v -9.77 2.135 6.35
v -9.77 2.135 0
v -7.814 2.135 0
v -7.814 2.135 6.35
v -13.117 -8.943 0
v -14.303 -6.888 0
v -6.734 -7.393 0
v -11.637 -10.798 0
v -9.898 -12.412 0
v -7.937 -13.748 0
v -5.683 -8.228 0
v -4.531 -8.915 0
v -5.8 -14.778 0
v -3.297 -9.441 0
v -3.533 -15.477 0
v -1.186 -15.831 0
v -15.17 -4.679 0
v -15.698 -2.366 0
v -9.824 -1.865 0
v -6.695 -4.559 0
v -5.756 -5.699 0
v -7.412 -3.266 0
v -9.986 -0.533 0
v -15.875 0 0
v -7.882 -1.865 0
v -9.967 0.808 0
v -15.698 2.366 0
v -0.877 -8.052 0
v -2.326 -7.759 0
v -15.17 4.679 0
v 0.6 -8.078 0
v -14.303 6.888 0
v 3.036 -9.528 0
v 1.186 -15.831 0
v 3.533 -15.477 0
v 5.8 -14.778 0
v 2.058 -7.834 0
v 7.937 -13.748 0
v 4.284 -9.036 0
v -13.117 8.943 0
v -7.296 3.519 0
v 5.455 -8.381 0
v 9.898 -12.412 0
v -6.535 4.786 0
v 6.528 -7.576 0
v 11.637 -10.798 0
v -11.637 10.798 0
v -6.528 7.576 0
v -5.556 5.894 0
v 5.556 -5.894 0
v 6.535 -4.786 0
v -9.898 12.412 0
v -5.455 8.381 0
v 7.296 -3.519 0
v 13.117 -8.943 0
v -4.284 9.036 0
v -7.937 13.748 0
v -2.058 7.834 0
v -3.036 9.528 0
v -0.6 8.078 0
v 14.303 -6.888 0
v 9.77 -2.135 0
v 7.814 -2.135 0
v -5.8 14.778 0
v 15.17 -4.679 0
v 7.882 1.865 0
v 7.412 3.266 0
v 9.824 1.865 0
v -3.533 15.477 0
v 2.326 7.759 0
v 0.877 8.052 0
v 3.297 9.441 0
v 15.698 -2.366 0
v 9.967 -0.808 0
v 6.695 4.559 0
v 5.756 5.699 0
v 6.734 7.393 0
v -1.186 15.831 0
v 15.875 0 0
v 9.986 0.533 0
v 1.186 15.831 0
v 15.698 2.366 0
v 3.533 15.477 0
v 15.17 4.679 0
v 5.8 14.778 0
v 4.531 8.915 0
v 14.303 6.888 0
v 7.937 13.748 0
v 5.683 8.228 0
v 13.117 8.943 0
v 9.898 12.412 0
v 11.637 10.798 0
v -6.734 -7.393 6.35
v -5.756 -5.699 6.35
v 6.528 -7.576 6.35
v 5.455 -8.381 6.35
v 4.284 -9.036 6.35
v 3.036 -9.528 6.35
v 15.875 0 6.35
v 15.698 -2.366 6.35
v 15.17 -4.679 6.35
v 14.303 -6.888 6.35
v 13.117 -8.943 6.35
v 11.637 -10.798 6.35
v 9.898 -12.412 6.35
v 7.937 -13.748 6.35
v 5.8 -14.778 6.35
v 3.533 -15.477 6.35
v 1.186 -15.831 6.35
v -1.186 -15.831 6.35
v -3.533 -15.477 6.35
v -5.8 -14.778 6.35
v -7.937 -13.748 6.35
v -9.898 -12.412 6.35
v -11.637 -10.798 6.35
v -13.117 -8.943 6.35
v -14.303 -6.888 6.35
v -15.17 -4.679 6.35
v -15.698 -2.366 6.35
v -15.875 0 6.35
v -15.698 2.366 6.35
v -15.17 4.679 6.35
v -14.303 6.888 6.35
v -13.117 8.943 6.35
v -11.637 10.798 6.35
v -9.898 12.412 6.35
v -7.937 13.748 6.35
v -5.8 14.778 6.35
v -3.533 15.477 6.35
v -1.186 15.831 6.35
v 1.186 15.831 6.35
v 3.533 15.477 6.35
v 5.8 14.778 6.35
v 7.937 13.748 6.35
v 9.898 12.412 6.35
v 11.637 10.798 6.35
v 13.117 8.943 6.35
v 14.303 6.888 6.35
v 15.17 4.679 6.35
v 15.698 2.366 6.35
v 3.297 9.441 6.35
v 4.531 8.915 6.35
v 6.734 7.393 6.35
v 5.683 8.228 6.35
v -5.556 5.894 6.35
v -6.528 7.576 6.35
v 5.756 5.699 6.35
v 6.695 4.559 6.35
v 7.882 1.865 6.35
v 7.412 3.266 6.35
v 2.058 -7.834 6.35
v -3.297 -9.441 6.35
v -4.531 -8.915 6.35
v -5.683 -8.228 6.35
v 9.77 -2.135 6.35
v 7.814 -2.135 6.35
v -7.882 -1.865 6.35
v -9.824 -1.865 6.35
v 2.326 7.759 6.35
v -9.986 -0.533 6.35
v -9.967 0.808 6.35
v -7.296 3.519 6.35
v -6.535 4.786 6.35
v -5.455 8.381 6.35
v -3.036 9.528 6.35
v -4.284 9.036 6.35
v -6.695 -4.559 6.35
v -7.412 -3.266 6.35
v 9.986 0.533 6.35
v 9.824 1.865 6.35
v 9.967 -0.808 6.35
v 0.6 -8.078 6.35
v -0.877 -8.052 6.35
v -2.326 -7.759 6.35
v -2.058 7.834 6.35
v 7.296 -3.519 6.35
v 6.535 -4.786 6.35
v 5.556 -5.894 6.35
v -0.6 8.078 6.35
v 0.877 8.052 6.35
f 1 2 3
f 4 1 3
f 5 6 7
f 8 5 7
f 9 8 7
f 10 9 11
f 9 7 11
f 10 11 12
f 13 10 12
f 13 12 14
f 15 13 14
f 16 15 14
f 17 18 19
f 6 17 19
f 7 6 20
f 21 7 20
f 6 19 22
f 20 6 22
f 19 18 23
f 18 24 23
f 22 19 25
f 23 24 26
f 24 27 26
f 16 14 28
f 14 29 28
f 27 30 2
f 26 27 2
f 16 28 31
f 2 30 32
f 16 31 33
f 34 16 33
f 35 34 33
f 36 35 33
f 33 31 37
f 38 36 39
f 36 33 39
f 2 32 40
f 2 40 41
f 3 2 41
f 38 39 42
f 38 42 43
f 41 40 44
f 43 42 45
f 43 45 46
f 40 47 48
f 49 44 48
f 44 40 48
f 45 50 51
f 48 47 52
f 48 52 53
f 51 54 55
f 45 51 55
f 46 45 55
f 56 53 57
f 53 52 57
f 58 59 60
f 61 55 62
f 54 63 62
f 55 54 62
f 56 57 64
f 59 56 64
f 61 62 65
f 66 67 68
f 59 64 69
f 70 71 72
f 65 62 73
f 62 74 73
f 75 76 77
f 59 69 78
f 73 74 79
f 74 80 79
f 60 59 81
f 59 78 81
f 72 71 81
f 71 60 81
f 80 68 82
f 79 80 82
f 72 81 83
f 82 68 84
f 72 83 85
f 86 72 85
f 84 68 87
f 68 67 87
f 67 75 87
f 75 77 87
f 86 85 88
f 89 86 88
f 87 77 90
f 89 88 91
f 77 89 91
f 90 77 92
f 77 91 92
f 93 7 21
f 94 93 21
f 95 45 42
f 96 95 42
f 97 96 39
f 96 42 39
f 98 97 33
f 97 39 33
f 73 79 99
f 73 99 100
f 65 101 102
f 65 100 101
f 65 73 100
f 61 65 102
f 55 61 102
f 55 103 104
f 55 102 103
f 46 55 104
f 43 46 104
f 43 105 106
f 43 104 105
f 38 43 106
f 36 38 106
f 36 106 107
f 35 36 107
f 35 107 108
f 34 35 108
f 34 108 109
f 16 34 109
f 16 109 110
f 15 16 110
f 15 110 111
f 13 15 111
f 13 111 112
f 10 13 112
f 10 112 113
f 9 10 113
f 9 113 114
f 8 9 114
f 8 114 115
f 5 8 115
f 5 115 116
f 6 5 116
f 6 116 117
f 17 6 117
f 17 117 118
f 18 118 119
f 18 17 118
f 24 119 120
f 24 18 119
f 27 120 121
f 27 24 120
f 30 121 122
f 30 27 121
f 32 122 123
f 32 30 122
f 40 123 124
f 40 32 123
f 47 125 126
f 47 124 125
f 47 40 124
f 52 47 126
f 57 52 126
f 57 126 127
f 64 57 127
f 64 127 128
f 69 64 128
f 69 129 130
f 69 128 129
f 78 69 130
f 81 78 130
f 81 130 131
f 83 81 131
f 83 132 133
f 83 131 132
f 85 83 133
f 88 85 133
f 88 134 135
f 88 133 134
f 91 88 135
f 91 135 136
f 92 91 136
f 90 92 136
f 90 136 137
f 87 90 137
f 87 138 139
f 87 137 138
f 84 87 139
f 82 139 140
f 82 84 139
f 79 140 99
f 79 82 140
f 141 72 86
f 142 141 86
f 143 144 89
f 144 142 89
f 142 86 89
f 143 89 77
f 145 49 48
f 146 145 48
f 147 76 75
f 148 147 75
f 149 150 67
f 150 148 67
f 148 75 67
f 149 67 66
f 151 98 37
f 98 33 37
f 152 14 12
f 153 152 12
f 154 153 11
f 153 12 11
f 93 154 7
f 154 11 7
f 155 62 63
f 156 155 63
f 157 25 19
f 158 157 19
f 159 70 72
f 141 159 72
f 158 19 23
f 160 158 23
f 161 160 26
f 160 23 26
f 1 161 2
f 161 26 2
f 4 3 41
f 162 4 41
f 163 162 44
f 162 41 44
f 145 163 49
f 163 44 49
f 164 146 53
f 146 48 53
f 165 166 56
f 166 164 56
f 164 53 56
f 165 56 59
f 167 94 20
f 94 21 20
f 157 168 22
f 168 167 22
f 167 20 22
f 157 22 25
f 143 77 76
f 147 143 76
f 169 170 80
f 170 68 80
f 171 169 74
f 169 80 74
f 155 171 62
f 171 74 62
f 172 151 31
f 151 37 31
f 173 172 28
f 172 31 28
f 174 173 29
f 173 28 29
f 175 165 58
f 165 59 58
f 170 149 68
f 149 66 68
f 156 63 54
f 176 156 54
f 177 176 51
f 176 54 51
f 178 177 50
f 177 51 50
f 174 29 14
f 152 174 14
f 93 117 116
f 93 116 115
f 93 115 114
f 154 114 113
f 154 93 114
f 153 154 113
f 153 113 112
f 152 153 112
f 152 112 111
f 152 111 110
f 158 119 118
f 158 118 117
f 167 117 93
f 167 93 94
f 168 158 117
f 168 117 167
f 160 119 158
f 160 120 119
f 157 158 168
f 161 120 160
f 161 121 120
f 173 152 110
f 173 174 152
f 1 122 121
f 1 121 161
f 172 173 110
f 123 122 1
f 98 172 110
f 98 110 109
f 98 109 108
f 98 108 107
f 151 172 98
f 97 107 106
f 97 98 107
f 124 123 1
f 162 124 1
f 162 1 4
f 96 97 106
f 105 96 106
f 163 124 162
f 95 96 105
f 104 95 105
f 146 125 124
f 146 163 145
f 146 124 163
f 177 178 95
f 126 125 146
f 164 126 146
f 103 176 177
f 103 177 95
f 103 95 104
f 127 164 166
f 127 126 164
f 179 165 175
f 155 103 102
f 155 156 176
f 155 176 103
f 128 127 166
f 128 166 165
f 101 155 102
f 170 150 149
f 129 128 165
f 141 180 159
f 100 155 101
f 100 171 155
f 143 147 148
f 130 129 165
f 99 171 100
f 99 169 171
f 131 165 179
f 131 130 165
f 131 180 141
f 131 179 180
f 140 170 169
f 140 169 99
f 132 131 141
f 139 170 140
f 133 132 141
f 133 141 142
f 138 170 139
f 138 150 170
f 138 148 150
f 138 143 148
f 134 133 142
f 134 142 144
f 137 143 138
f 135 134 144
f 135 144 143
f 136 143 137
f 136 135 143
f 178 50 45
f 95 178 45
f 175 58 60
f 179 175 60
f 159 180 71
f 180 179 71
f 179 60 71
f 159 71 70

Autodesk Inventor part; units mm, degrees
ref_plane "YZ Plane" through (0, 0, 0) normal (1, 0, 0) x (0, 1, 0)
ref_plane "XZ Plane" through (0, 0, 0) normal (0, 1, 0) x (-1, 0, 0)
ref_plane "XY Plane" through (0, 0, 0) normal (0, 0, 1) x (1, 0, 0)
sketch "Sketch1" plane through (0, 0, 0) normal (0, 0, 1) x (1, 0, 0)
  circle A0 centre (0, 0) radius 15.875
  line L0 (7.8823, 1.8652) -> (9.8245, 1.8652)
  arc A1 (9.7695, -2.1348) -> (9.8245, 1.8652) centre (0, 0) ccw
  line L1 (9.7695, -2.1348) -> (7.8136, -2.1348)
  arc A2 (5.5564, -5.8937) -> (7.8136, -2.1348) centre (0, 0) ccw
  line L2 (5.5564, -5.8937) -> (6.5275, -7.5757)
  arc A3 (3.0359, -9.528) -> (6.5275, -7.5757) centre (0, 0) ccw
  line L3 (3.0359, -9.528) -> (2.058, -7.8342)
  arc A4 (-2.3259, -7.7589) -> (2.058, -7.8342) centre (0, 0) ccw
  line L4 (-2.3259, -7.7589) -> (-3.297, -9.4409)
  arc A5 (-6.7336, -7.3932) -> (-3.297, -9.4409) centre (0, 0) ccw
  line L5 (-6.7336, -7.3932) -> (-5.7556, -5.6994)
  arc A6 (-7.8823, -1.8652) -> (-5.7556, -5.6994) centre (0, 0) ccw
  line L6 (-7.8823, -1.8652) -> (-9.8245, -1.8652)
  arc A7 (-9.7695, 2.1348) -> (-9.8245, -1.8652) centre (0, 0) ccw
  line L7 (-9.7695, 2.1348) -> (-7.8136, 2.1348)
  arc A8 (-5.5564, 5.8937) -> (-7.8136, 2.1348) centre (0, 0) ccw
  line L8 (-5.5564, 5.8937) -> (-6.5275, 7.5757)
  arc A9 (-3.0359, 9.528) -> (-6.5275, 7.5757) centre (0, 0) ccw
  line L9 (-3.0359, 9.528) -> (-2.058, 7.8342)
  arc A10 (2.3259, 7.7589) -> (-2.058, 7.8342) centre (0, 0) ccw
  line L10 (2.3259, 7.7589) -> (3.297, 9.4409)
  arc A11 (6.7336, 7.3932) -> (3.297, 9.4409) centre (0, 0) ccw
  line L11 (6.7336, 7.3932) -> (5.7556, 5.6994)
  arc A12 (7.8823, 1.8652) -> (5.7556, 5.6994) centre (0, 0) ccw
extrude "Extrusion1" add sketch "Sketch1" along normal blind 6.35
properties part number "coupler window motor"
